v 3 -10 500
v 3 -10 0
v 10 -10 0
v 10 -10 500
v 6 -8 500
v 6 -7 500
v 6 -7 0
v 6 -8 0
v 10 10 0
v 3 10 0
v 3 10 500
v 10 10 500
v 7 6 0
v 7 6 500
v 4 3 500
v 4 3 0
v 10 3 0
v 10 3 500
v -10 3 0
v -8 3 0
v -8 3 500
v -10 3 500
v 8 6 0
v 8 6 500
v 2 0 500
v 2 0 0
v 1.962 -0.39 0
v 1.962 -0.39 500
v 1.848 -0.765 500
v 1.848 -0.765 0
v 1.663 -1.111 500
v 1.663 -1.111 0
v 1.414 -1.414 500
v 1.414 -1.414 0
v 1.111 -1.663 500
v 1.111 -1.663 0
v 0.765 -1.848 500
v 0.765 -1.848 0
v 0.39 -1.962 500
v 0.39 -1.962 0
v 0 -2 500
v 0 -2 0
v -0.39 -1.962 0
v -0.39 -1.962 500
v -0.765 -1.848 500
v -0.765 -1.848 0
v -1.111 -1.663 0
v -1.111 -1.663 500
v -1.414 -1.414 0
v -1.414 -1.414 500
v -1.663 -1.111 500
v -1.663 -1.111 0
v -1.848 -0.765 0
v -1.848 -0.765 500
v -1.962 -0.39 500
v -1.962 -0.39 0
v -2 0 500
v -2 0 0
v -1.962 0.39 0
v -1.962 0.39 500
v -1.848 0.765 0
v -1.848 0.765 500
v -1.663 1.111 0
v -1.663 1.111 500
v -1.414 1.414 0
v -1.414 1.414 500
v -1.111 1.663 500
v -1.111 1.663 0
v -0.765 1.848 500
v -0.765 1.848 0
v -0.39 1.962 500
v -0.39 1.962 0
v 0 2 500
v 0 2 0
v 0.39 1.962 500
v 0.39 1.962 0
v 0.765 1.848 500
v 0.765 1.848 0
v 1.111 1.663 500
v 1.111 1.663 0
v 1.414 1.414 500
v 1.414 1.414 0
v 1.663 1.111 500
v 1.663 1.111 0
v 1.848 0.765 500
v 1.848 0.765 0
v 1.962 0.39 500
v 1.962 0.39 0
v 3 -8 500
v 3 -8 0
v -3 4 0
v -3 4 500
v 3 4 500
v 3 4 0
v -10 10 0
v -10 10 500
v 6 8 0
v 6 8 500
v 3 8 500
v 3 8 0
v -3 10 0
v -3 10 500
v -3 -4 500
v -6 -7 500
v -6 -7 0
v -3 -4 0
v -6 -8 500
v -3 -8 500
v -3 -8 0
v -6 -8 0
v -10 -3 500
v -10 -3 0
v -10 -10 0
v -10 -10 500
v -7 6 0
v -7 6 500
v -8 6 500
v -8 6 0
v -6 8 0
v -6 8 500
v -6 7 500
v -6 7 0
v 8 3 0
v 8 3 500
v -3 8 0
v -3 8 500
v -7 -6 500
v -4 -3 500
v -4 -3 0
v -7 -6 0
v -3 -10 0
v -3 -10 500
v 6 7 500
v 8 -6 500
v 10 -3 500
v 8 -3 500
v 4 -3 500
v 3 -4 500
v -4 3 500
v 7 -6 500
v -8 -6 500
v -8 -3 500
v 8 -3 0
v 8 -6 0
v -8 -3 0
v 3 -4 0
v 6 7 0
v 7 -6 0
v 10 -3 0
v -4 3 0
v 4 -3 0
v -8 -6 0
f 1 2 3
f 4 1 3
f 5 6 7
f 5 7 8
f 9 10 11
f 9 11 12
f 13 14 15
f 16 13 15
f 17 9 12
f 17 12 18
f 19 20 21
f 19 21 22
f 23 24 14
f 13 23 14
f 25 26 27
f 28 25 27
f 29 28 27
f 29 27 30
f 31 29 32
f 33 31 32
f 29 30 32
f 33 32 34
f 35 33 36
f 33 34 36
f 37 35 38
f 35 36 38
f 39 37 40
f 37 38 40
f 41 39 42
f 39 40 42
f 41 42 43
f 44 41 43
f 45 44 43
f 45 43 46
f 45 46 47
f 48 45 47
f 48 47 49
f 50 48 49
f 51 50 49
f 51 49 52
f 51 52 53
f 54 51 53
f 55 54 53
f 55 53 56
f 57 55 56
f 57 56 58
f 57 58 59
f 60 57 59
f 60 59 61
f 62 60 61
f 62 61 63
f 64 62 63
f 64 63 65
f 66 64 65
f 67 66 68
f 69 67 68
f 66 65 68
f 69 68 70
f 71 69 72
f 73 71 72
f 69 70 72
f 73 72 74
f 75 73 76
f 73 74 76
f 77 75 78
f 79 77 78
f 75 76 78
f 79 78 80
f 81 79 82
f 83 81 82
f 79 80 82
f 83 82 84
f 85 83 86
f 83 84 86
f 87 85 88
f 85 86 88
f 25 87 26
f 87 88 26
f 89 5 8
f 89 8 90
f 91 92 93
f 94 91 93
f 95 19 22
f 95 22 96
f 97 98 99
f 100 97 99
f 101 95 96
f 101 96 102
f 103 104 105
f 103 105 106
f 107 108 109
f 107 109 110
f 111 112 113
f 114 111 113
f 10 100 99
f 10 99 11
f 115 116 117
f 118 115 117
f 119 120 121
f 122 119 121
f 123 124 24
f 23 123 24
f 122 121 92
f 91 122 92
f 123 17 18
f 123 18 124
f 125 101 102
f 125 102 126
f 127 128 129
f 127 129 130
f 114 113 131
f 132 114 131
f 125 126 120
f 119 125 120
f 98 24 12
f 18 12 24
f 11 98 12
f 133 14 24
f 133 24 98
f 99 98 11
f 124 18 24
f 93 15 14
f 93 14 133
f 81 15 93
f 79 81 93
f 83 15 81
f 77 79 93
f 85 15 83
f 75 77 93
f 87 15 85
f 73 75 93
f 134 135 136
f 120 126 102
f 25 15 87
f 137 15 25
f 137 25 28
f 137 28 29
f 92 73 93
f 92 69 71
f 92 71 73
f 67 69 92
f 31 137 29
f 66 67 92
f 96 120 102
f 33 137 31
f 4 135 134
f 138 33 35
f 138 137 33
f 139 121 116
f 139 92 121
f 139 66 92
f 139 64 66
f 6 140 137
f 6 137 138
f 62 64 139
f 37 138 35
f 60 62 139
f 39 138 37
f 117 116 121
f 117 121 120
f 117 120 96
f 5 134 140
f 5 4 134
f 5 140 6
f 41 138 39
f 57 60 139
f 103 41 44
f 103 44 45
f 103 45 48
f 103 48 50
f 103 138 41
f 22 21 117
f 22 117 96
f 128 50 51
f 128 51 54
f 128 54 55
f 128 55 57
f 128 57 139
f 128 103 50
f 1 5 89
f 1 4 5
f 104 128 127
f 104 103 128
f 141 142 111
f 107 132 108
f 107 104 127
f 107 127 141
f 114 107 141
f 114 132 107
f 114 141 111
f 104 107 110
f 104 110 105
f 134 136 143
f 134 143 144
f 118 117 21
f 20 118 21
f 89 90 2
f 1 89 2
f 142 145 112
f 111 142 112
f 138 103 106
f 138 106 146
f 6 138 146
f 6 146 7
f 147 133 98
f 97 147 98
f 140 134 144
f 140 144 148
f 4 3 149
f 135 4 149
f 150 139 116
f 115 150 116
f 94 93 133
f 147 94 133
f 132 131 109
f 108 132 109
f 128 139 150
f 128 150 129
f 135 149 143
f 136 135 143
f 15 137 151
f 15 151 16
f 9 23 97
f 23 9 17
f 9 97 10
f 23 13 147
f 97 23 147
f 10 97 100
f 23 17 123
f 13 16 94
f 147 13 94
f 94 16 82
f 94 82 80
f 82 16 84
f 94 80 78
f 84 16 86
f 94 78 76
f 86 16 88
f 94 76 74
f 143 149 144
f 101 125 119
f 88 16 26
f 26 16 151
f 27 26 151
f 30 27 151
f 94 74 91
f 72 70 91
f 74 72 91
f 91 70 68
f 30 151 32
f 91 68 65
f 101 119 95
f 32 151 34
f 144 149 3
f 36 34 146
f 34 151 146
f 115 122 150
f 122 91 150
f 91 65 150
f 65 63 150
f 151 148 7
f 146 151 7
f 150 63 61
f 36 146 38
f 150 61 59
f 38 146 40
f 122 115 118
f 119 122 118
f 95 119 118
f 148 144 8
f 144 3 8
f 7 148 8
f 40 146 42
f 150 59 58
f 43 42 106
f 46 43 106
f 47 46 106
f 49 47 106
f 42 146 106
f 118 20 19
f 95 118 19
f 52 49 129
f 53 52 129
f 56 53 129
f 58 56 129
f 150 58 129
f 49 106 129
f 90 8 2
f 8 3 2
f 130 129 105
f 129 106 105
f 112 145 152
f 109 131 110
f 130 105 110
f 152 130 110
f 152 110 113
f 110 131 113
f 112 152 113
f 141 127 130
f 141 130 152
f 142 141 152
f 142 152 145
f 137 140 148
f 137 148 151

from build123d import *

# Parameters (mm, degrees)
PAD_DEPTH    = 500
SKETCH001_R  = 2
POCKET_DEPTH = 500.001


with BuildPart() as change_me_for_height:
    # Sketch → Pad (new body)
    with BuildSketch(Plane.XY):
        Polygon((-10, 3), (-10, 10), (-3, 10), (-3, 8), (-6, 8), (-6, 7), (-3, 4), (3, 4), (6, 7), (6, 8), (3, 8), (3, 10), (10, 10), (10, 3), (8, 3), (8, 6), (7, 6), (4, 3), (4, 0), (-4, 0), (-4, 3), (-7, 6), (-8, 6), (-8, 3), align=None)
    pad = extrude(amount=PAD_DEPTH)


with BuildPart() as mirrored:
    # Mirrored base: copy of Change_me_for_height
    add(change_me_for_height.part)

    # Mirrored: Pad across Sketch H_Axis
    add(pad.mirror(Plane.ZX))


with BuildPart() as pocket:
    # Fusion base: copy of Change_me_for_height
    add(change_me_for_height.part)

    # Fusion: union Mirrored
    add(mirrored.part)

    # Sketch001 → Pocket (cut, through all)
    with BuildSketch(Plane(origin=(0, 0, 0), x_dir=(1, 0, 0), z_dir=(0, 0, -1))):
        Circle(SKETCH001_R)
    extrude(amount=-POCKET_DEPTH, mode=Mode.SUBTRACT)


solid = pocket.part
